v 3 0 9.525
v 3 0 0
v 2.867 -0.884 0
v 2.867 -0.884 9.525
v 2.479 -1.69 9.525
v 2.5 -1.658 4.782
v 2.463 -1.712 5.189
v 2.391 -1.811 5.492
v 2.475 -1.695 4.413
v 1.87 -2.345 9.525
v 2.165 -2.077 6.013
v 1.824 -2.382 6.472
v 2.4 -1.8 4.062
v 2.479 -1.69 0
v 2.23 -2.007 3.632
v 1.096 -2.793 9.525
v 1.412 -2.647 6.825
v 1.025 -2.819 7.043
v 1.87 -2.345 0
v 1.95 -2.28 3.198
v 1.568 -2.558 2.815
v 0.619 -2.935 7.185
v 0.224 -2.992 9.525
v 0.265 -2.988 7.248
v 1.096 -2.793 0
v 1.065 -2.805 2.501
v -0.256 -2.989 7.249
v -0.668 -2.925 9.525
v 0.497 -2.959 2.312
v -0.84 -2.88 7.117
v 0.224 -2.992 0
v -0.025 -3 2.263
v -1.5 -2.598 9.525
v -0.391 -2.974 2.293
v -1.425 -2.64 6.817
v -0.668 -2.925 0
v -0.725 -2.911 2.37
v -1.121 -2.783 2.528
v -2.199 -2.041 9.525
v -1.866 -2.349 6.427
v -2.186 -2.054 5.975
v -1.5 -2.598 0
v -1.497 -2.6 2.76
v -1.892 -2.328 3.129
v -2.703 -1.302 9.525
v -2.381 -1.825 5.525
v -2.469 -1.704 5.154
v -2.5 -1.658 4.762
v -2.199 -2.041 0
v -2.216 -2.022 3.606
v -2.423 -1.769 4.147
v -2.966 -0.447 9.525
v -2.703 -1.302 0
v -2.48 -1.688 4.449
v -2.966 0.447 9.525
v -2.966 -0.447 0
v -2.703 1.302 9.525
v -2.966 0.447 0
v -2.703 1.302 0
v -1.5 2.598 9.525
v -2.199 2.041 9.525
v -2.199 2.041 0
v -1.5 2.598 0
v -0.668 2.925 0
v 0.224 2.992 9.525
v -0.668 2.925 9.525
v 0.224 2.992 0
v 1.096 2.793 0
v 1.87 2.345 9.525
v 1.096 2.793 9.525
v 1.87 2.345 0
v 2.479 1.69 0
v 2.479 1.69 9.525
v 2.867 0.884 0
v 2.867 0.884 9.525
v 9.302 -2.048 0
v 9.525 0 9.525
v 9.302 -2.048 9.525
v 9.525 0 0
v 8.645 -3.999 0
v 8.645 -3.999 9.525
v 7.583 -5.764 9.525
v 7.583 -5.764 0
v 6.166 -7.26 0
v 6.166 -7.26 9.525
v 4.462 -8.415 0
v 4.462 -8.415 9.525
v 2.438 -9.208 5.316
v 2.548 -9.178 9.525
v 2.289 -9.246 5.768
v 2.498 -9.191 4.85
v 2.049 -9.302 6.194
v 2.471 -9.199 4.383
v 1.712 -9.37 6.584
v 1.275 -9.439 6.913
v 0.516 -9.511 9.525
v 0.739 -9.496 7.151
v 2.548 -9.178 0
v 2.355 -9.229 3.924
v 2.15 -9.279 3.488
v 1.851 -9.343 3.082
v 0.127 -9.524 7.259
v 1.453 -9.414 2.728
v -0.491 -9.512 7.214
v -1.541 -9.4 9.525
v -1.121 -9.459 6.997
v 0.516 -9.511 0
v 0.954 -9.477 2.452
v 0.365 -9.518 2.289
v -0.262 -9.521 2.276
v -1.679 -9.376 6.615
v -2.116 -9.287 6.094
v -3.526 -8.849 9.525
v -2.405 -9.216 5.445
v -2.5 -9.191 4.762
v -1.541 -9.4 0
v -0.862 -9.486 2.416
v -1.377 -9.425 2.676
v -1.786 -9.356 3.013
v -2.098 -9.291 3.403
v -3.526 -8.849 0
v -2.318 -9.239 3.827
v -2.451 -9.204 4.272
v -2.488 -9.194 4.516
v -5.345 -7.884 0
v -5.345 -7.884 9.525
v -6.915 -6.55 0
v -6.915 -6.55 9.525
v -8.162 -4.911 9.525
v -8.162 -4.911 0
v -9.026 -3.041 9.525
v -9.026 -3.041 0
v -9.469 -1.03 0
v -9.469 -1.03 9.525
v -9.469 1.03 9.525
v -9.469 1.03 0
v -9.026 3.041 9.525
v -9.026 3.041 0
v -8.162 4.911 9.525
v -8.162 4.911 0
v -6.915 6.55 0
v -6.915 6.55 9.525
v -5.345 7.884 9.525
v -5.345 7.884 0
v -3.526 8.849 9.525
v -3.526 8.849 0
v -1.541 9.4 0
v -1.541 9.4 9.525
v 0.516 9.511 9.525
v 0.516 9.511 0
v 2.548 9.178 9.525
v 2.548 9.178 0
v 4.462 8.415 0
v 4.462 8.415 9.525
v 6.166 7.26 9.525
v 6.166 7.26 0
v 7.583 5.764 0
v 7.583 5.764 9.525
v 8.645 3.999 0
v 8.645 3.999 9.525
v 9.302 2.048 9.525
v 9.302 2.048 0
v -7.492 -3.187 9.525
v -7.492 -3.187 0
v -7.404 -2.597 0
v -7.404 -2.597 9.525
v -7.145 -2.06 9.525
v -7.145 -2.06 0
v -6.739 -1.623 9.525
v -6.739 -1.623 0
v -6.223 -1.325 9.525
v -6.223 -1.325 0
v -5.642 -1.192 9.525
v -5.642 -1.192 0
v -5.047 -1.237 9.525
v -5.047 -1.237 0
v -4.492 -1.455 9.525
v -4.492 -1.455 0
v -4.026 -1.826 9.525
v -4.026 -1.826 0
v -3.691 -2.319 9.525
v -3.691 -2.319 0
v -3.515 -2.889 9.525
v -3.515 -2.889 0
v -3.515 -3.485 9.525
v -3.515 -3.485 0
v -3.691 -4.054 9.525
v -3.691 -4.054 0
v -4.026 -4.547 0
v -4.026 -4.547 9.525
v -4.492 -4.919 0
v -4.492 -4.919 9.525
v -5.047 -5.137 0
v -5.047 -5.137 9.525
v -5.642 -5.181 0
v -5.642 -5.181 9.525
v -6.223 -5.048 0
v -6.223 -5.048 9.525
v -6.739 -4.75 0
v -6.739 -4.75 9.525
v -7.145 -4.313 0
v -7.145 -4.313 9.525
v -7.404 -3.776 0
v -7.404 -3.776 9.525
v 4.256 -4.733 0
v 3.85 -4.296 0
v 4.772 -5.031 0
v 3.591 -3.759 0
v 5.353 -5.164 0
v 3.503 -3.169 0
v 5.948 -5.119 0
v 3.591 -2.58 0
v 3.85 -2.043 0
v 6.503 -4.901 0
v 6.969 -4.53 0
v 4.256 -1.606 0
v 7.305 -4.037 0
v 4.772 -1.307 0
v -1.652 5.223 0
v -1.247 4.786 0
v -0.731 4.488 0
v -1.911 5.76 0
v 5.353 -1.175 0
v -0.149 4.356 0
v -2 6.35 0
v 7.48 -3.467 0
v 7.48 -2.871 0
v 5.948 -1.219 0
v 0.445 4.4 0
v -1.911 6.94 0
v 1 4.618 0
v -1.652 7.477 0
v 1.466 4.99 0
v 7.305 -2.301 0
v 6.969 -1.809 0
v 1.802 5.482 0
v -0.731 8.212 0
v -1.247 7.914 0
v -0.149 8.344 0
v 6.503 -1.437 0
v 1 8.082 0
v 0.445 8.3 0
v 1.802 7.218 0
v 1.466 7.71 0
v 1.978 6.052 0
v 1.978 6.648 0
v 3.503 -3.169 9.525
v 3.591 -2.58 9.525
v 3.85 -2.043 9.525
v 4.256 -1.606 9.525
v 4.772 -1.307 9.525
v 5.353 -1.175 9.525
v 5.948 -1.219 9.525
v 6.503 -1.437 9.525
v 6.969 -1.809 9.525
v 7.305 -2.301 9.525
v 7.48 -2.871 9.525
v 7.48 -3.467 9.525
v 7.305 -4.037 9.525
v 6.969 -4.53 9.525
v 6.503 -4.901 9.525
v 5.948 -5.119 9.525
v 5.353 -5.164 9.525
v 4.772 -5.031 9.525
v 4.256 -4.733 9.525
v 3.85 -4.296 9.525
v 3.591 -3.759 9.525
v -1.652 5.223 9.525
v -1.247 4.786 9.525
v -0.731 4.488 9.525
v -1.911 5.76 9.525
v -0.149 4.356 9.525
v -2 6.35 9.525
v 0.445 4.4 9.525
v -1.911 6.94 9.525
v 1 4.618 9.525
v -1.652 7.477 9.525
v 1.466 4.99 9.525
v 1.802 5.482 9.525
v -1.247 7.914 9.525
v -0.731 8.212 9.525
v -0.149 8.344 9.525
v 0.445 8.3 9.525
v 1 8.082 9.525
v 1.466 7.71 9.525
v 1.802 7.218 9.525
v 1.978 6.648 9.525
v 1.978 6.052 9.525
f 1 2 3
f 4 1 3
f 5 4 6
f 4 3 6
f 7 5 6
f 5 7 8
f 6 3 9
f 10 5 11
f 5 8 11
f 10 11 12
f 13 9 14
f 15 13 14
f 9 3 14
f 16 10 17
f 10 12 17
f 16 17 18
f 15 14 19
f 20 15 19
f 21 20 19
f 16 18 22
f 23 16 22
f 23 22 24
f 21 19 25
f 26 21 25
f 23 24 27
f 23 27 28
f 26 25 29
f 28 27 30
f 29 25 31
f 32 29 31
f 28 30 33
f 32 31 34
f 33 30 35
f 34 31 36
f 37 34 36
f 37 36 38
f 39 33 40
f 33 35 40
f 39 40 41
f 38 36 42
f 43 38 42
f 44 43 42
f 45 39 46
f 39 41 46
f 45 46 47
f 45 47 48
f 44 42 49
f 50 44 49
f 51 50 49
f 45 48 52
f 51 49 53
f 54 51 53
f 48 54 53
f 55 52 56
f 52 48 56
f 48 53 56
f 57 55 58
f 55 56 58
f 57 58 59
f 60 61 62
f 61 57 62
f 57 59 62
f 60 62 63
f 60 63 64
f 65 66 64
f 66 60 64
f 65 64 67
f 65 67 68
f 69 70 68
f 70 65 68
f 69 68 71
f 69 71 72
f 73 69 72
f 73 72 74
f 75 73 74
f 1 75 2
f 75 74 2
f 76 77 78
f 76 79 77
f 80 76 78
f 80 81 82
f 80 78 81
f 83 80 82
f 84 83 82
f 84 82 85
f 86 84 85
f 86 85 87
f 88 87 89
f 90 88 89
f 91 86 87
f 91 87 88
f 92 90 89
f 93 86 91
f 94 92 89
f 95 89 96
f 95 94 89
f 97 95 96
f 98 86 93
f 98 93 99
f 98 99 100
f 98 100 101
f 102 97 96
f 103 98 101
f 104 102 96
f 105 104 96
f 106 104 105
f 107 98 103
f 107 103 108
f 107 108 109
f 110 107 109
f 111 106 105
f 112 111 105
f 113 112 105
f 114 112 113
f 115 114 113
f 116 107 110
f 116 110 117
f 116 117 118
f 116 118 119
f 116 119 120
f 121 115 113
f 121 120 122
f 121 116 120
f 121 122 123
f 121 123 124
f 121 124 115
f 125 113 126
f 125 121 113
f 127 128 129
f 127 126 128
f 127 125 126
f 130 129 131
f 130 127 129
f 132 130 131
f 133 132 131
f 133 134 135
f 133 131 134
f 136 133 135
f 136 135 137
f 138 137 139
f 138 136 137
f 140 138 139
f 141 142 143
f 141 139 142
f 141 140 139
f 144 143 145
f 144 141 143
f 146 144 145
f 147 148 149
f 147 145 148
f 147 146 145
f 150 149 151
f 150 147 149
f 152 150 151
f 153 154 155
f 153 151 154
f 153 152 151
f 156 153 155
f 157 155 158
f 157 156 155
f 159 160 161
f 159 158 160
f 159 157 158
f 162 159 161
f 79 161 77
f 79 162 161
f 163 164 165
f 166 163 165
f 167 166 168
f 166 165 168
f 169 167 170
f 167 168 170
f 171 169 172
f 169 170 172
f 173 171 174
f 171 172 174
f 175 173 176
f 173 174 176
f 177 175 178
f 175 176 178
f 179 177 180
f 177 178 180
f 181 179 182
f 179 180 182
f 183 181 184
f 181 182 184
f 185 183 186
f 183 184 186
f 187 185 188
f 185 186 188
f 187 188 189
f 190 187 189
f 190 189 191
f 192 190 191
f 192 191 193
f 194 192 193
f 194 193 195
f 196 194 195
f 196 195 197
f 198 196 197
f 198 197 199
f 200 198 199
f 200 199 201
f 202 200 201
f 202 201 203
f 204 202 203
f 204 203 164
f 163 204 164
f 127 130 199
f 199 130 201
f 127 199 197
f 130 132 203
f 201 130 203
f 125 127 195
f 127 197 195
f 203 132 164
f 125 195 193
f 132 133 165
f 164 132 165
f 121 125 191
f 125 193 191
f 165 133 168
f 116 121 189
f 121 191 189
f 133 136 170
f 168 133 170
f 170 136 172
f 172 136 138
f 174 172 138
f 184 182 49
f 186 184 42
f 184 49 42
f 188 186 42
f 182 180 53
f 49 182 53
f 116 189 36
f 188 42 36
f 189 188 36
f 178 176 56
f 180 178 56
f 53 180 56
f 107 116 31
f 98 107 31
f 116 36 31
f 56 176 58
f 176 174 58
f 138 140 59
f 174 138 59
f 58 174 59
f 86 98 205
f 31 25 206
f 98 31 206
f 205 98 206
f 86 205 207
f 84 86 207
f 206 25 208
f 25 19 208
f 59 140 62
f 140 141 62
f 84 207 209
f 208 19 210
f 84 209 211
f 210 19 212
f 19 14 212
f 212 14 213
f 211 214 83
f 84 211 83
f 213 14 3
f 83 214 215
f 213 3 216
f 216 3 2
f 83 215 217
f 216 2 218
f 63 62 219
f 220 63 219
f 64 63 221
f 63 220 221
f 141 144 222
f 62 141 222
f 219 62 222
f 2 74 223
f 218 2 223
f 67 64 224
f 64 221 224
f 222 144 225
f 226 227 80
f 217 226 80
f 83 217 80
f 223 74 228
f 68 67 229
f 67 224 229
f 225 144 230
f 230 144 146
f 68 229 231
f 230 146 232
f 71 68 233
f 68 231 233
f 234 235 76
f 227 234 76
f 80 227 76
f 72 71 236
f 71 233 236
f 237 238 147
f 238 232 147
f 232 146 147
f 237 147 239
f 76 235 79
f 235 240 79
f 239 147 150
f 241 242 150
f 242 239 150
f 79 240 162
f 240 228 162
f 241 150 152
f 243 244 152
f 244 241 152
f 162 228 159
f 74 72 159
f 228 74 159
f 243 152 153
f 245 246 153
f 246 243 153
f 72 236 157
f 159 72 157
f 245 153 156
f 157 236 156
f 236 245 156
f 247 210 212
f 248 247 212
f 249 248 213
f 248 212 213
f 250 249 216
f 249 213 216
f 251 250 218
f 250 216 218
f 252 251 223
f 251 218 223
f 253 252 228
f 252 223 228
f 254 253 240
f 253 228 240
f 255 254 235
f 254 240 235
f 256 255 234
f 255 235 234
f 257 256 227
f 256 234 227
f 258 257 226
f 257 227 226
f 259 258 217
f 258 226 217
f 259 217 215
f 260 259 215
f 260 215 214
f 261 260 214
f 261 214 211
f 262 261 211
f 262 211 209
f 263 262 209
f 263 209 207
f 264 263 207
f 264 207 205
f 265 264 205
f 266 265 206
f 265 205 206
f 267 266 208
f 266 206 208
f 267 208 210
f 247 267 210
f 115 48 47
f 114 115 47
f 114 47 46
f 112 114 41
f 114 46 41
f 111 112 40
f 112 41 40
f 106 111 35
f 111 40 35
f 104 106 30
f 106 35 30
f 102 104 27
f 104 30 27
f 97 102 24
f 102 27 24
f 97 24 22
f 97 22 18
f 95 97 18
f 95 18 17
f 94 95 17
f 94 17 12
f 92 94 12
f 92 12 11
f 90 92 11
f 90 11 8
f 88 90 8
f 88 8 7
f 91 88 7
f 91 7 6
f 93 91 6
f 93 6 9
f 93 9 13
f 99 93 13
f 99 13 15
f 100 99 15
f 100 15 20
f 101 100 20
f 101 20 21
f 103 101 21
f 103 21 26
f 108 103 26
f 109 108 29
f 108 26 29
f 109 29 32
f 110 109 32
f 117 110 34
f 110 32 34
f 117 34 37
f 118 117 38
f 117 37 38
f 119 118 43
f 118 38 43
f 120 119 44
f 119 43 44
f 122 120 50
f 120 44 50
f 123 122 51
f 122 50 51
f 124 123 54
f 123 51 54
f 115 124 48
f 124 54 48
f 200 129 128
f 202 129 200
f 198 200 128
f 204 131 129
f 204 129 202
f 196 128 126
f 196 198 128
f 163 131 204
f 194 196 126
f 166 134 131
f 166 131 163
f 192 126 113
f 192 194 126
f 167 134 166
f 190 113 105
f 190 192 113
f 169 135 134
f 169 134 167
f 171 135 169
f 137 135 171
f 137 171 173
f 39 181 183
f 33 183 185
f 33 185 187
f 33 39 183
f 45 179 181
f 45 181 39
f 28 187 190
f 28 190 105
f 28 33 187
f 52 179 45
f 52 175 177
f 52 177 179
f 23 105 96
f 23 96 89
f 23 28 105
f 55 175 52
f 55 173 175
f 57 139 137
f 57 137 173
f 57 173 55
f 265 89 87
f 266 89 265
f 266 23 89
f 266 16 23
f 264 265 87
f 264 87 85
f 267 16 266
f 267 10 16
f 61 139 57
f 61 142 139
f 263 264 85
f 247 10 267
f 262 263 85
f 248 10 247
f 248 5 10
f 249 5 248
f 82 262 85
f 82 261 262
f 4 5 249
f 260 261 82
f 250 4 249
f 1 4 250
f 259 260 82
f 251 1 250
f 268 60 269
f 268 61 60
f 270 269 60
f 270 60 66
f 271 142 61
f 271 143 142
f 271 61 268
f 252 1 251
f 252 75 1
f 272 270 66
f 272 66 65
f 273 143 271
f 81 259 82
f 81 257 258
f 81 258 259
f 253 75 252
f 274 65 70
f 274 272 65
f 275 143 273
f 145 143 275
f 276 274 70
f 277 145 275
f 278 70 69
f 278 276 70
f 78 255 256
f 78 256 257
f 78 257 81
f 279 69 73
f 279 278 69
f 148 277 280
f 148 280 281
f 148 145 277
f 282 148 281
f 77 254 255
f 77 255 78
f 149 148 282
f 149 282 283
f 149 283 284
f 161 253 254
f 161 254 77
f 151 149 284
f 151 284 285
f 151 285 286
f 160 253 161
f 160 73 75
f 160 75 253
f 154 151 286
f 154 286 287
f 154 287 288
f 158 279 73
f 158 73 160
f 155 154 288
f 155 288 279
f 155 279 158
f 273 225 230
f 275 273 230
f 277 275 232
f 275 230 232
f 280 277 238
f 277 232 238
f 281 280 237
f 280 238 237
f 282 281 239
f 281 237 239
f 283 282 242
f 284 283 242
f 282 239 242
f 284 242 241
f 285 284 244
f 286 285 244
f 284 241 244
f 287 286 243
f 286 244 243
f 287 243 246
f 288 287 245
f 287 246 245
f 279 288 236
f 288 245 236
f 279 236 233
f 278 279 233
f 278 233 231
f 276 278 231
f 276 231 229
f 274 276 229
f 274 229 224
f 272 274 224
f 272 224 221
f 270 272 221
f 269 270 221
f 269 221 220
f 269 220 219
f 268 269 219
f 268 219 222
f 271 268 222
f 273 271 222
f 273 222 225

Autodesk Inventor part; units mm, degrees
ref_plane "YZ Plane" through (0, 0, 0) normal (1, 0, 0) x (0, 1, 0)
ref_plane "XZ Plane" through (0, 0, 0) normal (0, 1, 0) x (-1, 0, 0)
ref_plane "XY Plane" through (0, 0, 0) normal (0, 0, 1) x (1, 0, 0)
sketch "Sketch3" plane through (0, 0, 0) normal (0, 0, 1) x (1, 0, 0)
  circle A0 centre (0, 0) radius 9.525
  circle A1 centre (0, 0) radius 3
  circle A2 centre (6.2, 0) radius 1.5
  circle A3 centre (3.1, 5.3694) radius 1.5
  circle A4 centre (-3.1, 5.3694) radius 1.5
  circle A5 centre (-6.2, 0) radius 1.5
  circle A6 centre (-3.1, -5.3694) radius 1.5
  circle A7 centre (3.1, -5.3694) radius 1.5
  dimension "d0" = 19.05
  dimension "d1" = 6
  dimension "d4" = 3
  dimension "d5" = 6.2
  dimension "d12" = 360
extrude "Extrusion1" add sketch "Sketch3" along normal blind 9.525 contours A0 | A2 | A3 | A4 | A5 | A6 | A7
sketch "Sketch7" plane through (0, 0, 0) normal (0, 1, 0) x (-1, 0, 0)
  circle A0 centre (0, 4.7625) radius 2.5
  line L0 (-9.525, 0) -> (-9.525, 9.525) projected
  point P0 (0, 0)
  point P1 (-9.525, 4.7625)
  dimension "d42" = 5
extrude "Extrusion5" cut sketch "Sketch7" against normal through all
sketch "Sketch8" plane through (0, 0, 0) normal (0, 0, -1) x (-1, 0, 0)
  circle A0 centre (0, 6.35) radius 2
  circle A1 centre (-5.5026, -3.1692) radius 2
  circle A2 centre (5.4925, -3.1867) radius 2
  circle A3 centre (0.0202, 6.35) radius 2
  point P0 (0, 0)
  dimension "d45" = 4
  dimension "d46" = 6.35
  dimension "d49" = 359.817
extrude "Extrusion6" cut sketch "Sketch8" against normal through all contours A0 A3 | A3 A0 | A1 | A2 picked at (-0.6435, 6.35) picked at (-1.9787, 6.4301)
properties part number "6mm Mounting Hub, thin" material "Aluminum 6061"
